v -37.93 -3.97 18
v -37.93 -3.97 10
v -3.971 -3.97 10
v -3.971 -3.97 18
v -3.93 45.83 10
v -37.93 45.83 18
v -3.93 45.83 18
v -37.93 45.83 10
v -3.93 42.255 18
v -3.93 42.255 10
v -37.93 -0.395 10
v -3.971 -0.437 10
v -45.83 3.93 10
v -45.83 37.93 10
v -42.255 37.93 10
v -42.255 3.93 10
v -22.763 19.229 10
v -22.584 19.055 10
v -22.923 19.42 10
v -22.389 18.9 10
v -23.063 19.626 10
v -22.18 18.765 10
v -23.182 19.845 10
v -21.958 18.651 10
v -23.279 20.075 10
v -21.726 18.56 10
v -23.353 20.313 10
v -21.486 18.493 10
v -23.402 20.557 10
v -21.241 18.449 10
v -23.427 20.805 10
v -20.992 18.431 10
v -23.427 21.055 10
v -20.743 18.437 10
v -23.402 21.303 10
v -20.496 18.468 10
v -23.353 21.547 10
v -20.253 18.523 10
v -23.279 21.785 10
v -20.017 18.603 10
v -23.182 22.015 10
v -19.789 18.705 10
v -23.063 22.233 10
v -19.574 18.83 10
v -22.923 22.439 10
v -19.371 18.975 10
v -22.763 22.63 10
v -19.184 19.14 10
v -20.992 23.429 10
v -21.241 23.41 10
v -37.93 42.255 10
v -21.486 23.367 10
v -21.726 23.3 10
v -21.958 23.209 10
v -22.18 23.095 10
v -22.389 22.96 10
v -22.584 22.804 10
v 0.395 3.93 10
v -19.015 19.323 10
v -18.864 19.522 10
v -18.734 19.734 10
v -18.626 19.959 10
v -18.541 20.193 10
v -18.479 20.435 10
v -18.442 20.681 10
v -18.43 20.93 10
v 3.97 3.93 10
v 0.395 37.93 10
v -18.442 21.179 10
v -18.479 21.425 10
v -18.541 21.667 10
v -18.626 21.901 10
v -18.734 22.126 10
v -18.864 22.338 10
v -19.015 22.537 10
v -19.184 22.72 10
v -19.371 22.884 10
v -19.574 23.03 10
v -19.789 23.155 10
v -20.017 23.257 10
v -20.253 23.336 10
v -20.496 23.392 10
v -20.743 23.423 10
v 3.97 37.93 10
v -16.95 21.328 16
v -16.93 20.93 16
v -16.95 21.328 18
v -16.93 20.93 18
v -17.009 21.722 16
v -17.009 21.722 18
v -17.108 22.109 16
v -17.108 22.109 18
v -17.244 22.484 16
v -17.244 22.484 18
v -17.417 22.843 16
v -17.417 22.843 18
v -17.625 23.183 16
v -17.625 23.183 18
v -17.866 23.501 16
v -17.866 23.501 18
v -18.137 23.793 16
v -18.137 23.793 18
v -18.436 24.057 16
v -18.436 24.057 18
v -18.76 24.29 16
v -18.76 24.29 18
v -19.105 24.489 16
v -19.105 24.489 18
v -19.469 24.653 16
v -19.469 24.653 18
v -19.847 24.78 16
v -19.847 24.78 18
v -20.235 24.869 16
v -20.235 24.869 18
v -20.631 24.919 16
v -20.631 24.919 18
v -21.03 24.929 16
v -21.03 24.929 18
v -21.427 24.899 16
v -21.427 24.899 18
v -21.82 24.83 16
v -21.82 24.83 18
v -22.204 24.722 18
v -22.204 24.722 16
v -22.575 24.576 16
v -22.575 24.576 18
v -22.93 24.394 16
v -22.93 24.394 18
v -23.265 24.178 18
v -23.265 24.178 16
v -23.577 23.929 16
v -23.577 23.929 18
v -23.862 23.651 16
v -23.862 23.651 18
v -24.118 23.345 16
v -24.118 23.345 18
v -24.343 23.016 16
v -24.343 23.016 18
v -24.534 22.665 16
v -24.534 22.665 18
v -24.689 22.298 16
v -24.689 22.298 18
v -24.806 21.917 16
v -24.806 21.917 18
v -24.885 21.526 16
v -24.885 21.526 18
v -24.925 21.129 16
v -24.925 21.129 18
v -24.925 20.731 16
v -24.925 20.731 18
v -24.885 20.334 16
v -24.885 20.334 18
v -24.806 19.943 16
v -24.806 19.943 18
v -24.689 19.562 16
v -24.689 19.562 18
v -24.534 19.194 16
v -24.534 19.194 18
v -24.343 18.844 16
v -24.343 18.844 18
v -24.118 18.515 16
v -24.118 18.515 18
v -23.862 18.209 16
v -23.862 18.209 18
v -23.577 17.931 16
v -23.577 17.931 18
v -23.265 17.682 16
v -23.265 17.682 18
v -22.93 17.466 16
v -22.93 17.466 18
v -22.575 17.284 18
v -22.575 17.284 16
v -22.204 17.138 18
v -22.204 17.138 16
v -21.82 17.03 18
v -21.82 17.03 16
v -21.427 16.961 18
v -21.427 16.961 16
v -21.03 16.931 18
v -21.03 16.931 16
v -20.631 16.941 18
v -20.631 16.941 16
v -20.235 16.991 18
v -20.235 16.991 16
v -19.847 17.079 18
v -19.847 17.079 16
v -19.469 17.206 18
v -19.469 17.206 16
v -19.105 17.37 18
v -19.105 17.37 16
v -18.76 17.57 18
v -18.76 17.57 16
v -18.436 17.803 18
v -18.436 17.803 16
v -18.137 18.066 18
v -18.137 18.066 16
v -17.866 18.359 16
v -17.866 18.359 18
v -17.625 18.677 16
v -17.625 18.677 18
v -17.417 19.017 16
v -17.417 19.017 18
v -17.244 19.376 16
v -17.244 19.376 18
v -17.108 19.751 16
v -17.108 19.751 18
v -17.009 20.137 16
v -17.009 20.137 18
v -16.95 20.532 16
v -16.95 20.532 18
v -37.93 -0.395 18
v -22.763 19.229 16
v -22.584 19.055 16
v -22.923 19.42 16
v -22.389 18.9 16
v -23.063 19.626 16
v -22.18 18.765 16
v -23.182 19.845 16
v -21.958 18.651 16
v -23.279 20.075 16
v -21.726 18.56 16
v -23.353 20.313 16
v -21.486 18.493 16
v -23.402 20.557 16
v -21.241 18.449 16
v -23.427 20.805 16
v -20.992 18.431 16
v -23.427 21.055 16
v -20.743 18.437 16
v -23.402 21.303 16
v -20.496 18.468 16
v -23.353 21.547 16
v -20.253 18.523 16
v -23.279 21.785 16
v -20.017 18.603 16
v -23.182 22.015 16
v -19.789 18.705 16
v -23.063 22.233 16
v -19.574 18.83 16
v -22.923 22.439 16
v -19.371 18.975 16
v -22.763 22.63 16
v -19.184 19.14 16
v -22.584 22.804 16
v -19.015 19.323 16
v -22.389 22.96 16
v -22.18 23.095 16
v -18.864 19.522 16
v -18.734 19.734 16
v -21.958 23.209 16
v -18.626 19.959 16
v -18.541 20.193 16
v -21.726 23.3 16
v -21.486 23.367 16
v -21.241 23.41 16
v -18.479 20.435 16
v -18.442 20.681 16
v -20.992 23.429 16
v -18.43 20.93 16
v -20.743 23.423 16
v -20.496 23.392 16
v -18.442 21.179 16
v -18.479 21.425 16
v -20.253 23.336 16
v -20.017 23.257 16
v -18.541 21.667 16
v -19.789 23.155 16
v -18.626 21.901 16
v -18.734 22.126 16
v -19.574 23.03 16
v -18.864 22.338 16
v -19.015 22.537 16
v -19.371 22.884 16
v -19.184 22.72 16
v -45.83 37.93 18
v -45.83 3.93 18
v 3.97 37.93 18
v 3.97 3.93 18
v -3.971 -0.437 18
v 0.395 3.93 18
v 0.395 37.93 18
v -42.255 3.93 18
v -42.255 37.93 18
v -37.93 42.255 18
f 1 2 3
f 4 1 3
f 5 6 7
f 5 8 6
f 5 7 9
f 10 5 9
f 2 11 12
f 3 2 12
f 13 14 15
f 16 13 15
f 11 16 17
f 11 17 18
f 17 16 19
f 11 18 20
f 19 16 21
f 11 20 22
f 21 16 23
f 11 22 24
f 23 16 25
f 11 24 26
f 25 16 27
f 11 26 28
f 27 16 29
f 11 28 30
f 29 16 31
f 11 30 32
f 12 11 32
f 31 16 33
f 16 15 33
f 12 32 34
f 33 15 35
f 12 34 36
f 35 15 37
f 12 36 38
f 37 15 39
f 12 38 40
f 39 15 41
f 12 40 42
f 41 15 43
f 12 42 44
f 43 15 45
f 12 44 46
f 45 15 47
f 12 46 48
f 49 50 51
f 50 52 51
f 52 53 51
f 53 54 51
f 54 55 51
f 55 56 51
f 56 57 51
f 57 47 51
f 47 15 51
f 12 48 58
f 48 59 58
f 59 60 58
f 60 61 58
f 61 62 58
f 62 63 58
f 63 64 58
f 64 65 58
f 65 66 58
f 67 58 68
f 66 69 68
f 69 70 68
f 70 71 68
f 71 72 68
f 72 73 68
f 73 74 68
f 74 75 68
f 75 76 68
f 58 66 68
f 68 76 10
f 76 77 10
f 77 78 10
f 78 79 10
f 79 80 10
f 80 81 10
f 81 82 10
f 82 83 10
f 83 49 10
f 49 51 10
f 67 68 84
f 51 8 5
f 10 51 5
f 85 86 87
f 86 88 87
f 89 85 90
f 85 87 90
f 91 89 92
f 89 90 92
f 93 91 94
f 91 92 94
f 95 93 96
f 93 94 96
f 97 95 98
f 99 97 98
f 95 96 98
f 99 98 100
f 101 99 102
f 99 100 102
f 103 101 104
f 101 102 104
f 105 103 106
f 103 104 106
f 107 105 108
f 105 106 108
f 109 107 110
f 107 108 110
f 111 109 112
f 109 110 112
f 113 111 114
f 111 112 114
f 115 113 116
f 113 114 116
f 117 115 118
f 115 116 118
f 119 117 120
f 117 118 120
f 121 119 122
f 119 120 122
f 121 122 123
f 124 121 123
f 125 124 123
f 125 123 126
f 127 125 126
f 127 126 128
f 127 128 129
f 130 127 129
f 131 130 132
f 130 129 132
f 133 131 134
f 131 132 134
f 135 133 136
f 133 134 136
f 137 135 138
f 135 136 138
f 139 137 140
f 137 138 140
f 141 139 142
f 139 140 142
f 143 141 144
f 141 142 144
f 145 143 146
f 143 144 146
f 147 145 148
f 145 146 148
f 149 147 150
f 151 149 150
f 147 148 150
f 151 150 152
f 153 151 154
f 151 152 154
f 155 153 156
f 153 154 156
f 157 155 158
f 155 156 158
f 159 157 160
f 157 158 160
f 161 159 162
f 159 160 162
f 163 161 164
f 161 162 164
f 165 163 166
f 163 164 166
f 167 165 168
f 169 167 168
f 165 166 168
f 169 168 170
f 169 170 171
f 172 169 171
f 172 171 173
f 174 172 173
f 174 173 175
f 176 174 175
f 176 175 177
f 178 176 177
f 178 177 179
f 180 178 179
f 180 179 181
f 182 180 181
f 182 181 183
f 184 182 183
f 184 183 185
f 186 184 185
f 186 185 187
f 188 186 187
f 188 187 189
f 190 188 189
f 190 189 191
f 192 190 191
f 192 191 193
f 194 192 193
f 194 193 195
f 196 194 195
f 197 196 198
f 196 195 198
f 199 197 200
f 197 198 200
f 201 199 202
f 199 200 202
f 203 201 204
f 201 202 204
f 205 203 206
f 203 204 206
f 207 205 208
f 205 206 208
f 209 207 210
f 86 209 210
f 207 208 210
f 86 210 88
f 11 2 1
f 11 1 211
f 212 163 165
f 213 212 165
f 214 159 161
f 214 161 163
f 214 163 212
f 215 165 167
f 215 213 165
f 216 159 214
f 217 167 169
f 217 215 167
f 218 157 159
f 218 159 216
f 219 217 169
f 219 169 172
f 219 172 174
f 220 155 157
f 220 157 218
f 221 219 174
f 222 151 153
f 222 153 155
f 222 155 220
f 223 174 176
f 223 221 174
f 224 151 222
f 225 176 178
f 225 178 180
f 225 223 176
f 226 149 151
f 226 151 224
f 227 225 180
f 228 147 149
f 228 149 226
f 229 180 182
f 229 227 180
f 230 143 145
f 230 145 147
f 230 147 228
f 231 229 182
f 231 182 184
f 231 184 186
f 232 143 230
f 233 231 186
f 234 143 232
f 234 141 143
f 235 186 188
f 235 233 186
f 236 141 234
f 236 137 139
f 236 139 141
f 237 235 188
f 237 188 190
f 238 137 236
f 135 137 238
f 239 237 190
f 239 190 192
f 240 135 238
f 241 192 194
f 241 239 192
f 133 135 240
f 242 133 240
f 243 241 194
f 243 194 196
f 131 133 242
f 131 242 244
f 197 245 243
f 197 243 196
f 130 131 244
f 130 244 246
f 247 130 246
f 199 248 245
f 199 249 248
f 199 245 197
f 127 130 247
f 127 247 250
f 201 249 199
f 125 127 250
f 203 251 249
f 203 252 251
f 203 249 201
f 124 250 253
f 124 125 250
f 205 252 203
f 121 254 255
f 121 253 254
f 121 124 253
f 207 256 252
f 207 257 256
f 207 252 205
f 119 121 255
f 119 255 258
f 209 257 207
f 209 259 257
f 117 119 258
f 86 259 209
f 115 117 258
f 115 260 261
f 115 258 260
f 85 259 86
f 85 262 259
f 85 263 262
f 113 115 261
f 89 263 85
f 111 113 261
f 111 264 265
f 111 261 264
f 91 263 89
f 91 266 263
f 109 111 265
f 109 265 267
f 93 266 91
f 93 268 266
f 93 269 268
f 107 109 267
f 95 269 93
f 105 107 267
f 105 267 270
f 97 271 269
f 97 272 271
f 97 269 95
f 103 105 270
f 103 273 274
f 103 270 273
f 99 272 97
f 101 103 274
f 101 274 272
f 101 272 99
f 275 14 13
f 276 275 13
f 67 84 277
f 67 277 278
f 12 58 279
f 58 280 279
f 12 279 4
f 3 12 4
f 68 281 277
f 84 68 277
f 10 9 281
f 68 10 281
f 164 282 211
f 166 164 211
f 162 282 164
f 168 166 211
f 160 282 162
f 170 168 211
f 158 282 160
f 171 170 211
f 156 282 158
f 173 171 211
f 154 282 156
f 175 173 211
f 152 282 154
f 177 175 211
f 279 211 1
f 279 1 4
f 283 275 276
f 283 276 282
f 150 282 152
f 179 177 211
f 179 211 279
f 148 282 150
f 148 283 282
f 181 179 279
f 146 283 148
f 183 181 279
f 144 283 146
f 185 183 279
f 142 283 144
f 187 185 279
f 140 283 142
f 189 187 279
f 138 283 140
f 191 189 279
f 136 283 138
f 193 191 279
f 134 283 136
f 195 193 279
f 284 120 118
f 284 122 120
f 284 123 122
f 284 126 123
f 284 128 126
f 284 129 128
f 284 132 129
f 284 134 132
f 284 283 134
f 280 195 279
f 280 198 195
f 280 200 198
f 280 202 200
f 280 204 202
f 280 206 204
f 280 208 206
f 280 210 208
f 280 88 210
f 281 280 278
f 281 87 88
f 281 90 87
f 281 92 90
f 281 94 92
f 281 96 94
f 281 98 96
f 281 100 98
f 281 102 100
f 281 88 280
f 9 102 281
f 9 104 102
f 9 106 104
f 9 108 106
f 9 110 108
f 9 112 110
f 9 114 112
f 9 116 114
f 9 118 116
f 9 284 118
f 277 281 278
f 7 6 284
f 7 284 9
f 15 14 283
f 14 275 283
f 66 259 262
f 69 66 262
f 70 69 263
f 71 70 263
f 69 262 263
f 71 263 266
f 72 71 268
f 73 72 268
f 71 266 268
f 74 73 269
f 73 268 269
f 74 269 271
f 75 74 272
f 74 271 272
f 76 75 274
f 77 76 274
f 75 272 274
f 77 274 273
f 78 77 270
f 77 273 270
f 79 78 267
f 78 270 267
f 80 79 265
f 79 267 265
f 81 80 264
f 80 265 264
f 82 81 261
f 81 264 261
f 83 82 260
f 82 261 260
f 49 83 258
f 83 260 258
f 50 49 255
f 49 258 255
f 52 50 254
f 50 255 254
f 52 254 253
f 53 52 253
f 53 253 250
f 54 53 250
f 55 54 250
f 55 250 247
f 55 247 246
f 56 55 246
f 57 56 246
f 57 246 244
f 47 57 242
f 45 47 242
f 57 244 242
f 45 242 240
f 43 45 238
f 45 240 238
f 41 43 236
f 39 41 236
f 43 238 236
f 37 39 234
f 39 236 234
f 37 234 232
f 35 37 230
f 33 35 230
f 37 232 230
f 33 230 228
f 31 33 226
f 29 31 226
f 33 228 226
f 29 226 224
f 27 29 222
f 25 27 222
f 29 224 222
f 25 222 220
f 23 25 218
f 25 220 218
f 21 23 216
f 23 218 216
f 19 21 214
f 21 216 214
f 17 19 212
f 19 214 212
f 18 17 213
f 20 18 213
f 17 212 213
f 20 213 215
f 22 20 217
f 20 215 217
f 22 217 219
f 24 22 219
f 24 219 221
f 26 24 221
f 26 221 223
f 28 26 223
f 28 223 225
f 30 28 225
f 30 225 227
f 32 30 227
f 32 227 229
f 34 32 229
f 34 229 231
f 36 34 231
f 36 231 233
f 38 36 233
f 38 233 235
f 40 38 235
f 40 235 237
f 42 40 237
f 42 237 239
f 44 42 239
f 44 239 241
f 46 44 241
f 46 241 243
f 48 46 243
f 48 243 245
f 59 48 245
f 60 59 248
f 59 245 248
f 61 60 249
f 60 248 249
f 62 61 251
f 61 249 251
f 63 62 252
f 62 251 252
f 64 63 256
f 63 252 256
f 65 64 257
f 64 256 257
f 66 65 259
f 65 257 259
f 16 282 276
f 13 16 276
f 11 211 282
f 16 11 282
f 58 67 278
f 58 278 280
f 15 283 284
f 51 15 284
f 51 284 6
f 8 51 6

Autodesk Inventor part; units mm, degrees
ref_plane "YZ Plane" through (0, 0, 0) normal (1, 0, 0) x (0, 1, 0)
ref_plane "XZ Plane" through (0, 0, 0) normal (0, 1, 0) x (-1, 0, 0)
ref_plane "Work Plane1" through (0, 0, 10) normal (0, 0, 1) x (1, 0, 0)
sketch "Sketch1" plane through (0, 0, 10) normal (0, 0, 1) x (1, 0, 0)
  line L0 (-4.0299, -0.3538) -> (-2.2322, 1.4439) construction
  arc A0 (-1.4439, 2.2322) -> (-2.2322, 1.4439) centre (-0.9299, 0.9299) ccw construction
  line L1 (-1.4439, 2.2322) -> (0.3538, 4.0299) construction
  line L2 (-37.8299, 42.8299) -> (-37.8299, 37.8299) construction
  line L3 (-37.8299, 37.8299) -> (-42.9208, 37.8299) construction
  line L4 (-37.8299, 42.2137) -> (-37.8299, 45.8299) construction
  line L5 (-37.8299, 45.8299) -> (-4.0299, 45.8299) construction
  line L6 (-4.0299, 45.8299) -> (-4.0299, 42.2137) construction
  line L7 (-4.0299, 4.0299) -> (0.3538, 4.0299) projected
  circle A1 centre (-20.9299, 20.9299) radius 17.5 projected
  line L8 (-20.9299, 58.9723) -> (17.1124, 20.9299) construction
  line L9 (17.1124, 20.9299) -> (-20.9299, -17.1124) construction
  line L10 (-20.9299, -17.1124) -> (-58.9723, 20.9299) construction
  line L11 (-58.9723, 20.9299) -> (-20.9299, 58.9723) construction
  line L12 (-20.9299, 58.9723) -> (-20.9299, -17.1124) construction
  line L13 (17.1124, 20.9299) -> (-58.9723, 20.9299) construction
  line L14 (-20.9299, 58.9723) -> (32.8701, 58.9723) construction
  line L15 (-43.4299, 43.4299) -> (1.5701, 43.4299) construction
  line L16 (1.5701, 43.4299) -> (1.5701, -1.5701) construction
  line L17 (1.5701, -1.5701) -> (-43.4299, -1.5701) construction
  line L18 (-43.4299, -1.5701) -> (-43.4299, 43.4299) construction
  line L19 (-43.4299, 43.4299) -> (1.5701, -1.5701) construction
  line L20 (1.5701, 43.4299) -> (-43.4299, -1.5701) construction
  line L21 (-43.4299, 5.3876) -> (-43.4299, 36.4723)
  line L22 (-43.4299, 36.4723) -> (-36.4723, 43.4299)
  line L23 (-36.4723, 43.4299) -> (-5.3876, 43.4299)
  line L24 (-5.3876, 43.4299) -> (1.5701, 36.4723)
  line L25 (1.5701, 36.4723) -> (1.5701, 5.3876)
  line L26 (1.5701, 5.3876) -> (-5.3876, -1.5701)
  line L27 (-5.3876, -1.5701) -> (-36.4723, -1.5701)
  line L28 (-36.4723, -1.5701) -> (-43.4299, 5.3876)
  line L29 (-4.0299, 42.2137) -> (-37.8299, 42.2137) projected
  line L30 (-4.0299, -0.3538) -> (-4.0299, 4.0299) projected
  circle A2 centre (-20.9299, 20.9299) radius 1.5
  line L31 (-10.9299, 10.9299) -> (-30.9299, 10.9299) construction
  line L32 (-30.9299, 10.9299) -> (-30.9299, 30.9299) construction
  line L33 (-30.9299, 30.9299) -> (-10.9299, 30.9299) construction
  line L34 (-10.9299, 30.9299) -> (-10.9299, 10.9299) construction
  line L35 (-10.9299, 10.9299) -> (-30.9299, 30.9299) construction
  line L36 (-30.9299, 10.9299) -> (-10.9299, 30.9299) construction
  circle A3 centre (-30.9299, 30.9299) radius 1.4
  circle A4 centre (-30.9299, 10.9299) radius 1.4
  circle A5 centre (-10.9299, 10.9299) radius 1.4
  line L37 (-45.8299, 37.8299) -> (-42.0723, 37.8299) construction
  line L38 (-42.1723, 37.7299) -> (-45.8299, 37.7299)
  line L39 (-45.8299, 37.7299) -> (-45.8299, 4.1299)
  line L40 (-45.8299, 4.1299) -> (-42.1723, 4.1299)
  line L41 (-42.1723, 4.1299) -> (-42.1723, 37.7299)
  line L42 (-45.8299, 4.0299) -> (-42.0723, 4.0299) construction
  line L43 (-45.8299, 37.8299) -> (-42.0723, 37.8299) projected
  line L44 (-37.7299, 45.8299) -> (-4.1299, 45.8299)
  line L45 (-4.1299, 45.8299) -> (-4.1299, 42.1723)
  line L46 (-4.1299, 42.1723) -> (-37.7299, 42.1723)
  line L47 (-37.7299, 42.1723) -> (-37.7299, 45.8299)
  line L48 (0.4701, 37.8299) -> (0.4701, 4.0299) construction
  line L49 (0.4701, 4.0299) -> (3.9701, 4.0299) construction
  line L50 (3.9701, 37.8299) -> (3.9701, 4.0299) construction
  line L51 (0.4701, 37.8299) -> (3.9701, 37.8299) construction
  line L52 (-45.8299, -3.9701) -> (-4.0299, -3.9701) construction
  line L53 (0.3124, 37.7299) -> (3.9701, 37.7299)
  line L54 (3.9701, 37.7299) -> (3.9701, 4.1299)
  line L55 (3.9701, 4.1299) -> (0.3124, 4.1299)
  line L56 (0.3124, 4.1299) -> (0.3124, 37.7299)
  line L57 (-4.1713, -0.3538) -> (-37.7299, -0.3538)
  line L58 (-37.7299, -0.3538) -> (-37.7299, -3.9701)
  line L59 (-37.7299, -3.9701) -> (-4.1713, -3.9701)
  line L60 (-4.1713, -3.9701) -> (-4.1713, -0.3538)
  point P0 (-37.8299, 4.0299)
  dimension "d18" = 53.8
  dimension "d19" = 45
  dimension "d20" = 53.8
  dimension "d21" = 45
  dimension "d22" = 45
  dimension "d30" = 20
  dimension "d31" = 20
  dimension "d32" = 2.8
  dimension "d33" = 2.8
  dimension "d34" = 2.8
  dimension "d35" = 3
  dimension "d36" = 0.1
  dimension "d37" = 0.1
  dimension "d38" = 0.1
  dimension "d39" = 0.1
extrude "Extrusion1" add sketch "Sketch1" along normal blind 8 contours L30 L26 L57 L28 L41 L22 L46 L24 L56 L7 | L7 L26 L30 | L56 L24 L25 L26 | L26 L25 L24 L53 L54 L55 | L60 L59 L58 L57 L28 L27 L26 | L26 L27 L28 L57 | L46 L22 L29 L24 | L24 L29 L45 | L40 L39 L38 L22 L21 L28 | L28 L21 L22 L41 | L29 L22 L23 L24 | L24 L23 L22 L29 L47 L44 L45 | L47 L29 L22 | A1 | A2 | A3 | A4 | A5
sketch "Skizze4" plane through (0, 0, 18) normal (0, 0, 1) x (1, 0, 0)
  line L0 (-37.7299, 42.1723) -> (-42.1723, 37.7299) projected
  line L1 (-42.1723, 37.7299) -> (-45.8299, 37.7299) projected
  line L2 (-45.8299, 37.7299) -> (-45.8299, 4.1299) construction
  line L3 (-45.8299, 4.1299) -> (-42.1723, 4.1299) projected
  line L4 (-42.1723, 4.1299) -> (-37.6885, -0.3538) projected
  line L5 (-37.6885, -0.3538) -> (-37.7299, -0.3538) projected
  line L6 (-37.7299, -0.3538) -> (-37.7299, -3.9701) projected
  line L7 (-37.7299, -3.9701) -> (-4.1713, -3.9701) construction
  line L8 (-4.1713, -3.9701) -> (-4.1713, -0.3538) projected
  line L9 (-4.1713, -0.3538) -> (0.3124, 4.1299) projected
  line L10 (0.3124, 4.1299) -> (3.9701, 4.1299) projected
  line L11 (3.9701, 4.1299) -> (3.9701, 37.7299) construction
  line L12 (3.9701, 37.7299) -> (0.3124, 37.7299) projected
  line L13 (0.3124, 37.7299) -> (-4.1299, 42.1723) projected
  line L14 (-4.1299, 42.1723) -> (-4.1299, 45.8299) projected
  line L15 (-4.1299, 45.8299) -> (-37.7299, 45.8299) construction
  line L16 (-37.7299, 45.8299) -> (-37.7299, 42.1723) projected
  line L17 (-37.9299, 46.0299) -> (-3.9299, 46.0299) construction
  line L18 (-3.9299, 46.0299) -> (-3.9299, 42.2551)
  line L19 (-3.9299, 42.2551) -> (0.3953, 37.9299)
  line L20 (0.3953, 37.9299) -> (4.1701, 37.9299)
  line L21 (4.1701, 37.9299) -> (4.1701, 3.9299) construction
  line L22 (4.1701, 3.9299) -> (0.3953, 3.9299)
  line L23 (0.3953, 3.9299) -> (-3.9713, -0.4367)
  line L24 (-3.9713, -0.4367) -> (-3.9713, -4.1701)
  line L25 (-3.9713, -4.1701) -> (-37.9299, -4.1701) construction
  line L26 (-37.9299, -4.1701) -> (-37.9299, -0.3953)
  line L27 (-37.9299, -0.3953) -> (-42.2551, 3.9299)
  line L28 (-42.2551, 3.9299) -> (-46.0299, 3.9299)
  line L29 (-46.0299, 3.9299) -> (-46.0299, 37.9299) construction
  line L30 (-46.0299, 37.9299) -> (-42.2551, 37.9299)
  line L31 (-42.2551, 37.9299) -> (-37.9299, 42.2551)
  line L32 (-37.9299, 42.2551) -> (-37.9299, 46.0299)
  line L33 (-45.8299, 37.7299) -> (-45.8299, 37.9299)
  line L34 (-4.1299, 45.8299) -> (-37.7299, 45.8299) projected
  line L35 (-37.7299, 45.8299) -> (-37.9299, 45.8299)
  line L36 (-4.1299, 45.8299) -> (-3.9299, 45.8299)
  line L37 (3.9701, 37.7299) -> (3.9701, 37.9299)
  line L38 (3.9701, 4.1299) -> (3.9701, 37.7299) projected
  line L39 (3.9701, 4.1299) -> (3.9701, 3.9299)
  line L40 (-4.1713, -3.9701) -> (-3.9713, -3.9701)
  line L41 (-37.7299, -3.9701) -> (-37.9299, -3.9701)
  line L42 (-45.8299, 4.1299) -> (-45.8299, 3.9299)
  point P0 (0, 0)
  dimension "d40" = 0.2
extrude "IM_offset" add sketch "Skizze4" against normal up to surface (8 mm away)
sketch "Sketch27" plane through (0, 0, 18) normal (0, 0, 1) x (1, 0, 0)
  line L0 (-3.9299, 45.8299) -> (-37.9299, 45.8299) projected
  line L1 (-37.9299, 45.8299) -> (-37.9299, 42.2551) projected
  line L2 (-37.9299, 42.2551) -> (-42.2551, 37.9299) projected
  line L3 (-42.2551, 37.9299) -> (-45.8299, 37.9299) projected
  line L4 (-45.8299, 37.9299) -> (-45.8299, 3.9299) projected
  line L5 (-42.2551, 3.9299) -> (-45.8299, 3.9299) projected
  line L6 (-37.9299, -0.3953) -> (-42.2551, 3.9299) projected
  line L7 (-37.9299, -3.9701) -> (-37.9299, -0.3953) projected
  line L8 (-3.9713, -3.9701) -> (-37.9299, -3.9701) projected
  line L9 (-3.9713, -3.9701) -> (-3.9713, -0.4367) projected
  line L10 (-3.9713, -0.4367) -> (0.3953, 3.9299) projected
  line L11 (0.3953, 3.9299) -> (3.9701, 3.9299) projected
  line L12 (3.9701, 3.9299) -> (3.9701, 37.9299) projected
  line L13 (3.9701, 37.9299) -> (0.3953, 37.9299) projected
  line L14 (0.3953, 37.9299) -> (-3.9299, 42.2551) projected
  line L15 (-3.9299, 42.2551) -> (-3.9299, 45.8299) projected
  circle A0 centre (-20.9299, 20.9299) radius 24.9
  circle A1 centre (-20.9299, 20.9299) radius 2.5
  point P0 (0, 0)
  dimension "d167" = 5
extrude "Extrusion22" cut sketch "Sketch27" against normal blind 10 contours A1
sketch "Sketch28" plane through (0, 0, 18) normal (0, 0, 1) x (1, 0, 0)
  circle A0 centre (-20.9299, 20.9299) radius 2.5 projected
  circle A1 centre (-20.9299, 20.9299) radius 4
  point P0 (0, 0)
  dimension "d170" = 8
extrude "Extrusion23" cut sketch "Sketch28" against normal blind 2
properties part number "20_Cube_Insert_single_LED_holder"
